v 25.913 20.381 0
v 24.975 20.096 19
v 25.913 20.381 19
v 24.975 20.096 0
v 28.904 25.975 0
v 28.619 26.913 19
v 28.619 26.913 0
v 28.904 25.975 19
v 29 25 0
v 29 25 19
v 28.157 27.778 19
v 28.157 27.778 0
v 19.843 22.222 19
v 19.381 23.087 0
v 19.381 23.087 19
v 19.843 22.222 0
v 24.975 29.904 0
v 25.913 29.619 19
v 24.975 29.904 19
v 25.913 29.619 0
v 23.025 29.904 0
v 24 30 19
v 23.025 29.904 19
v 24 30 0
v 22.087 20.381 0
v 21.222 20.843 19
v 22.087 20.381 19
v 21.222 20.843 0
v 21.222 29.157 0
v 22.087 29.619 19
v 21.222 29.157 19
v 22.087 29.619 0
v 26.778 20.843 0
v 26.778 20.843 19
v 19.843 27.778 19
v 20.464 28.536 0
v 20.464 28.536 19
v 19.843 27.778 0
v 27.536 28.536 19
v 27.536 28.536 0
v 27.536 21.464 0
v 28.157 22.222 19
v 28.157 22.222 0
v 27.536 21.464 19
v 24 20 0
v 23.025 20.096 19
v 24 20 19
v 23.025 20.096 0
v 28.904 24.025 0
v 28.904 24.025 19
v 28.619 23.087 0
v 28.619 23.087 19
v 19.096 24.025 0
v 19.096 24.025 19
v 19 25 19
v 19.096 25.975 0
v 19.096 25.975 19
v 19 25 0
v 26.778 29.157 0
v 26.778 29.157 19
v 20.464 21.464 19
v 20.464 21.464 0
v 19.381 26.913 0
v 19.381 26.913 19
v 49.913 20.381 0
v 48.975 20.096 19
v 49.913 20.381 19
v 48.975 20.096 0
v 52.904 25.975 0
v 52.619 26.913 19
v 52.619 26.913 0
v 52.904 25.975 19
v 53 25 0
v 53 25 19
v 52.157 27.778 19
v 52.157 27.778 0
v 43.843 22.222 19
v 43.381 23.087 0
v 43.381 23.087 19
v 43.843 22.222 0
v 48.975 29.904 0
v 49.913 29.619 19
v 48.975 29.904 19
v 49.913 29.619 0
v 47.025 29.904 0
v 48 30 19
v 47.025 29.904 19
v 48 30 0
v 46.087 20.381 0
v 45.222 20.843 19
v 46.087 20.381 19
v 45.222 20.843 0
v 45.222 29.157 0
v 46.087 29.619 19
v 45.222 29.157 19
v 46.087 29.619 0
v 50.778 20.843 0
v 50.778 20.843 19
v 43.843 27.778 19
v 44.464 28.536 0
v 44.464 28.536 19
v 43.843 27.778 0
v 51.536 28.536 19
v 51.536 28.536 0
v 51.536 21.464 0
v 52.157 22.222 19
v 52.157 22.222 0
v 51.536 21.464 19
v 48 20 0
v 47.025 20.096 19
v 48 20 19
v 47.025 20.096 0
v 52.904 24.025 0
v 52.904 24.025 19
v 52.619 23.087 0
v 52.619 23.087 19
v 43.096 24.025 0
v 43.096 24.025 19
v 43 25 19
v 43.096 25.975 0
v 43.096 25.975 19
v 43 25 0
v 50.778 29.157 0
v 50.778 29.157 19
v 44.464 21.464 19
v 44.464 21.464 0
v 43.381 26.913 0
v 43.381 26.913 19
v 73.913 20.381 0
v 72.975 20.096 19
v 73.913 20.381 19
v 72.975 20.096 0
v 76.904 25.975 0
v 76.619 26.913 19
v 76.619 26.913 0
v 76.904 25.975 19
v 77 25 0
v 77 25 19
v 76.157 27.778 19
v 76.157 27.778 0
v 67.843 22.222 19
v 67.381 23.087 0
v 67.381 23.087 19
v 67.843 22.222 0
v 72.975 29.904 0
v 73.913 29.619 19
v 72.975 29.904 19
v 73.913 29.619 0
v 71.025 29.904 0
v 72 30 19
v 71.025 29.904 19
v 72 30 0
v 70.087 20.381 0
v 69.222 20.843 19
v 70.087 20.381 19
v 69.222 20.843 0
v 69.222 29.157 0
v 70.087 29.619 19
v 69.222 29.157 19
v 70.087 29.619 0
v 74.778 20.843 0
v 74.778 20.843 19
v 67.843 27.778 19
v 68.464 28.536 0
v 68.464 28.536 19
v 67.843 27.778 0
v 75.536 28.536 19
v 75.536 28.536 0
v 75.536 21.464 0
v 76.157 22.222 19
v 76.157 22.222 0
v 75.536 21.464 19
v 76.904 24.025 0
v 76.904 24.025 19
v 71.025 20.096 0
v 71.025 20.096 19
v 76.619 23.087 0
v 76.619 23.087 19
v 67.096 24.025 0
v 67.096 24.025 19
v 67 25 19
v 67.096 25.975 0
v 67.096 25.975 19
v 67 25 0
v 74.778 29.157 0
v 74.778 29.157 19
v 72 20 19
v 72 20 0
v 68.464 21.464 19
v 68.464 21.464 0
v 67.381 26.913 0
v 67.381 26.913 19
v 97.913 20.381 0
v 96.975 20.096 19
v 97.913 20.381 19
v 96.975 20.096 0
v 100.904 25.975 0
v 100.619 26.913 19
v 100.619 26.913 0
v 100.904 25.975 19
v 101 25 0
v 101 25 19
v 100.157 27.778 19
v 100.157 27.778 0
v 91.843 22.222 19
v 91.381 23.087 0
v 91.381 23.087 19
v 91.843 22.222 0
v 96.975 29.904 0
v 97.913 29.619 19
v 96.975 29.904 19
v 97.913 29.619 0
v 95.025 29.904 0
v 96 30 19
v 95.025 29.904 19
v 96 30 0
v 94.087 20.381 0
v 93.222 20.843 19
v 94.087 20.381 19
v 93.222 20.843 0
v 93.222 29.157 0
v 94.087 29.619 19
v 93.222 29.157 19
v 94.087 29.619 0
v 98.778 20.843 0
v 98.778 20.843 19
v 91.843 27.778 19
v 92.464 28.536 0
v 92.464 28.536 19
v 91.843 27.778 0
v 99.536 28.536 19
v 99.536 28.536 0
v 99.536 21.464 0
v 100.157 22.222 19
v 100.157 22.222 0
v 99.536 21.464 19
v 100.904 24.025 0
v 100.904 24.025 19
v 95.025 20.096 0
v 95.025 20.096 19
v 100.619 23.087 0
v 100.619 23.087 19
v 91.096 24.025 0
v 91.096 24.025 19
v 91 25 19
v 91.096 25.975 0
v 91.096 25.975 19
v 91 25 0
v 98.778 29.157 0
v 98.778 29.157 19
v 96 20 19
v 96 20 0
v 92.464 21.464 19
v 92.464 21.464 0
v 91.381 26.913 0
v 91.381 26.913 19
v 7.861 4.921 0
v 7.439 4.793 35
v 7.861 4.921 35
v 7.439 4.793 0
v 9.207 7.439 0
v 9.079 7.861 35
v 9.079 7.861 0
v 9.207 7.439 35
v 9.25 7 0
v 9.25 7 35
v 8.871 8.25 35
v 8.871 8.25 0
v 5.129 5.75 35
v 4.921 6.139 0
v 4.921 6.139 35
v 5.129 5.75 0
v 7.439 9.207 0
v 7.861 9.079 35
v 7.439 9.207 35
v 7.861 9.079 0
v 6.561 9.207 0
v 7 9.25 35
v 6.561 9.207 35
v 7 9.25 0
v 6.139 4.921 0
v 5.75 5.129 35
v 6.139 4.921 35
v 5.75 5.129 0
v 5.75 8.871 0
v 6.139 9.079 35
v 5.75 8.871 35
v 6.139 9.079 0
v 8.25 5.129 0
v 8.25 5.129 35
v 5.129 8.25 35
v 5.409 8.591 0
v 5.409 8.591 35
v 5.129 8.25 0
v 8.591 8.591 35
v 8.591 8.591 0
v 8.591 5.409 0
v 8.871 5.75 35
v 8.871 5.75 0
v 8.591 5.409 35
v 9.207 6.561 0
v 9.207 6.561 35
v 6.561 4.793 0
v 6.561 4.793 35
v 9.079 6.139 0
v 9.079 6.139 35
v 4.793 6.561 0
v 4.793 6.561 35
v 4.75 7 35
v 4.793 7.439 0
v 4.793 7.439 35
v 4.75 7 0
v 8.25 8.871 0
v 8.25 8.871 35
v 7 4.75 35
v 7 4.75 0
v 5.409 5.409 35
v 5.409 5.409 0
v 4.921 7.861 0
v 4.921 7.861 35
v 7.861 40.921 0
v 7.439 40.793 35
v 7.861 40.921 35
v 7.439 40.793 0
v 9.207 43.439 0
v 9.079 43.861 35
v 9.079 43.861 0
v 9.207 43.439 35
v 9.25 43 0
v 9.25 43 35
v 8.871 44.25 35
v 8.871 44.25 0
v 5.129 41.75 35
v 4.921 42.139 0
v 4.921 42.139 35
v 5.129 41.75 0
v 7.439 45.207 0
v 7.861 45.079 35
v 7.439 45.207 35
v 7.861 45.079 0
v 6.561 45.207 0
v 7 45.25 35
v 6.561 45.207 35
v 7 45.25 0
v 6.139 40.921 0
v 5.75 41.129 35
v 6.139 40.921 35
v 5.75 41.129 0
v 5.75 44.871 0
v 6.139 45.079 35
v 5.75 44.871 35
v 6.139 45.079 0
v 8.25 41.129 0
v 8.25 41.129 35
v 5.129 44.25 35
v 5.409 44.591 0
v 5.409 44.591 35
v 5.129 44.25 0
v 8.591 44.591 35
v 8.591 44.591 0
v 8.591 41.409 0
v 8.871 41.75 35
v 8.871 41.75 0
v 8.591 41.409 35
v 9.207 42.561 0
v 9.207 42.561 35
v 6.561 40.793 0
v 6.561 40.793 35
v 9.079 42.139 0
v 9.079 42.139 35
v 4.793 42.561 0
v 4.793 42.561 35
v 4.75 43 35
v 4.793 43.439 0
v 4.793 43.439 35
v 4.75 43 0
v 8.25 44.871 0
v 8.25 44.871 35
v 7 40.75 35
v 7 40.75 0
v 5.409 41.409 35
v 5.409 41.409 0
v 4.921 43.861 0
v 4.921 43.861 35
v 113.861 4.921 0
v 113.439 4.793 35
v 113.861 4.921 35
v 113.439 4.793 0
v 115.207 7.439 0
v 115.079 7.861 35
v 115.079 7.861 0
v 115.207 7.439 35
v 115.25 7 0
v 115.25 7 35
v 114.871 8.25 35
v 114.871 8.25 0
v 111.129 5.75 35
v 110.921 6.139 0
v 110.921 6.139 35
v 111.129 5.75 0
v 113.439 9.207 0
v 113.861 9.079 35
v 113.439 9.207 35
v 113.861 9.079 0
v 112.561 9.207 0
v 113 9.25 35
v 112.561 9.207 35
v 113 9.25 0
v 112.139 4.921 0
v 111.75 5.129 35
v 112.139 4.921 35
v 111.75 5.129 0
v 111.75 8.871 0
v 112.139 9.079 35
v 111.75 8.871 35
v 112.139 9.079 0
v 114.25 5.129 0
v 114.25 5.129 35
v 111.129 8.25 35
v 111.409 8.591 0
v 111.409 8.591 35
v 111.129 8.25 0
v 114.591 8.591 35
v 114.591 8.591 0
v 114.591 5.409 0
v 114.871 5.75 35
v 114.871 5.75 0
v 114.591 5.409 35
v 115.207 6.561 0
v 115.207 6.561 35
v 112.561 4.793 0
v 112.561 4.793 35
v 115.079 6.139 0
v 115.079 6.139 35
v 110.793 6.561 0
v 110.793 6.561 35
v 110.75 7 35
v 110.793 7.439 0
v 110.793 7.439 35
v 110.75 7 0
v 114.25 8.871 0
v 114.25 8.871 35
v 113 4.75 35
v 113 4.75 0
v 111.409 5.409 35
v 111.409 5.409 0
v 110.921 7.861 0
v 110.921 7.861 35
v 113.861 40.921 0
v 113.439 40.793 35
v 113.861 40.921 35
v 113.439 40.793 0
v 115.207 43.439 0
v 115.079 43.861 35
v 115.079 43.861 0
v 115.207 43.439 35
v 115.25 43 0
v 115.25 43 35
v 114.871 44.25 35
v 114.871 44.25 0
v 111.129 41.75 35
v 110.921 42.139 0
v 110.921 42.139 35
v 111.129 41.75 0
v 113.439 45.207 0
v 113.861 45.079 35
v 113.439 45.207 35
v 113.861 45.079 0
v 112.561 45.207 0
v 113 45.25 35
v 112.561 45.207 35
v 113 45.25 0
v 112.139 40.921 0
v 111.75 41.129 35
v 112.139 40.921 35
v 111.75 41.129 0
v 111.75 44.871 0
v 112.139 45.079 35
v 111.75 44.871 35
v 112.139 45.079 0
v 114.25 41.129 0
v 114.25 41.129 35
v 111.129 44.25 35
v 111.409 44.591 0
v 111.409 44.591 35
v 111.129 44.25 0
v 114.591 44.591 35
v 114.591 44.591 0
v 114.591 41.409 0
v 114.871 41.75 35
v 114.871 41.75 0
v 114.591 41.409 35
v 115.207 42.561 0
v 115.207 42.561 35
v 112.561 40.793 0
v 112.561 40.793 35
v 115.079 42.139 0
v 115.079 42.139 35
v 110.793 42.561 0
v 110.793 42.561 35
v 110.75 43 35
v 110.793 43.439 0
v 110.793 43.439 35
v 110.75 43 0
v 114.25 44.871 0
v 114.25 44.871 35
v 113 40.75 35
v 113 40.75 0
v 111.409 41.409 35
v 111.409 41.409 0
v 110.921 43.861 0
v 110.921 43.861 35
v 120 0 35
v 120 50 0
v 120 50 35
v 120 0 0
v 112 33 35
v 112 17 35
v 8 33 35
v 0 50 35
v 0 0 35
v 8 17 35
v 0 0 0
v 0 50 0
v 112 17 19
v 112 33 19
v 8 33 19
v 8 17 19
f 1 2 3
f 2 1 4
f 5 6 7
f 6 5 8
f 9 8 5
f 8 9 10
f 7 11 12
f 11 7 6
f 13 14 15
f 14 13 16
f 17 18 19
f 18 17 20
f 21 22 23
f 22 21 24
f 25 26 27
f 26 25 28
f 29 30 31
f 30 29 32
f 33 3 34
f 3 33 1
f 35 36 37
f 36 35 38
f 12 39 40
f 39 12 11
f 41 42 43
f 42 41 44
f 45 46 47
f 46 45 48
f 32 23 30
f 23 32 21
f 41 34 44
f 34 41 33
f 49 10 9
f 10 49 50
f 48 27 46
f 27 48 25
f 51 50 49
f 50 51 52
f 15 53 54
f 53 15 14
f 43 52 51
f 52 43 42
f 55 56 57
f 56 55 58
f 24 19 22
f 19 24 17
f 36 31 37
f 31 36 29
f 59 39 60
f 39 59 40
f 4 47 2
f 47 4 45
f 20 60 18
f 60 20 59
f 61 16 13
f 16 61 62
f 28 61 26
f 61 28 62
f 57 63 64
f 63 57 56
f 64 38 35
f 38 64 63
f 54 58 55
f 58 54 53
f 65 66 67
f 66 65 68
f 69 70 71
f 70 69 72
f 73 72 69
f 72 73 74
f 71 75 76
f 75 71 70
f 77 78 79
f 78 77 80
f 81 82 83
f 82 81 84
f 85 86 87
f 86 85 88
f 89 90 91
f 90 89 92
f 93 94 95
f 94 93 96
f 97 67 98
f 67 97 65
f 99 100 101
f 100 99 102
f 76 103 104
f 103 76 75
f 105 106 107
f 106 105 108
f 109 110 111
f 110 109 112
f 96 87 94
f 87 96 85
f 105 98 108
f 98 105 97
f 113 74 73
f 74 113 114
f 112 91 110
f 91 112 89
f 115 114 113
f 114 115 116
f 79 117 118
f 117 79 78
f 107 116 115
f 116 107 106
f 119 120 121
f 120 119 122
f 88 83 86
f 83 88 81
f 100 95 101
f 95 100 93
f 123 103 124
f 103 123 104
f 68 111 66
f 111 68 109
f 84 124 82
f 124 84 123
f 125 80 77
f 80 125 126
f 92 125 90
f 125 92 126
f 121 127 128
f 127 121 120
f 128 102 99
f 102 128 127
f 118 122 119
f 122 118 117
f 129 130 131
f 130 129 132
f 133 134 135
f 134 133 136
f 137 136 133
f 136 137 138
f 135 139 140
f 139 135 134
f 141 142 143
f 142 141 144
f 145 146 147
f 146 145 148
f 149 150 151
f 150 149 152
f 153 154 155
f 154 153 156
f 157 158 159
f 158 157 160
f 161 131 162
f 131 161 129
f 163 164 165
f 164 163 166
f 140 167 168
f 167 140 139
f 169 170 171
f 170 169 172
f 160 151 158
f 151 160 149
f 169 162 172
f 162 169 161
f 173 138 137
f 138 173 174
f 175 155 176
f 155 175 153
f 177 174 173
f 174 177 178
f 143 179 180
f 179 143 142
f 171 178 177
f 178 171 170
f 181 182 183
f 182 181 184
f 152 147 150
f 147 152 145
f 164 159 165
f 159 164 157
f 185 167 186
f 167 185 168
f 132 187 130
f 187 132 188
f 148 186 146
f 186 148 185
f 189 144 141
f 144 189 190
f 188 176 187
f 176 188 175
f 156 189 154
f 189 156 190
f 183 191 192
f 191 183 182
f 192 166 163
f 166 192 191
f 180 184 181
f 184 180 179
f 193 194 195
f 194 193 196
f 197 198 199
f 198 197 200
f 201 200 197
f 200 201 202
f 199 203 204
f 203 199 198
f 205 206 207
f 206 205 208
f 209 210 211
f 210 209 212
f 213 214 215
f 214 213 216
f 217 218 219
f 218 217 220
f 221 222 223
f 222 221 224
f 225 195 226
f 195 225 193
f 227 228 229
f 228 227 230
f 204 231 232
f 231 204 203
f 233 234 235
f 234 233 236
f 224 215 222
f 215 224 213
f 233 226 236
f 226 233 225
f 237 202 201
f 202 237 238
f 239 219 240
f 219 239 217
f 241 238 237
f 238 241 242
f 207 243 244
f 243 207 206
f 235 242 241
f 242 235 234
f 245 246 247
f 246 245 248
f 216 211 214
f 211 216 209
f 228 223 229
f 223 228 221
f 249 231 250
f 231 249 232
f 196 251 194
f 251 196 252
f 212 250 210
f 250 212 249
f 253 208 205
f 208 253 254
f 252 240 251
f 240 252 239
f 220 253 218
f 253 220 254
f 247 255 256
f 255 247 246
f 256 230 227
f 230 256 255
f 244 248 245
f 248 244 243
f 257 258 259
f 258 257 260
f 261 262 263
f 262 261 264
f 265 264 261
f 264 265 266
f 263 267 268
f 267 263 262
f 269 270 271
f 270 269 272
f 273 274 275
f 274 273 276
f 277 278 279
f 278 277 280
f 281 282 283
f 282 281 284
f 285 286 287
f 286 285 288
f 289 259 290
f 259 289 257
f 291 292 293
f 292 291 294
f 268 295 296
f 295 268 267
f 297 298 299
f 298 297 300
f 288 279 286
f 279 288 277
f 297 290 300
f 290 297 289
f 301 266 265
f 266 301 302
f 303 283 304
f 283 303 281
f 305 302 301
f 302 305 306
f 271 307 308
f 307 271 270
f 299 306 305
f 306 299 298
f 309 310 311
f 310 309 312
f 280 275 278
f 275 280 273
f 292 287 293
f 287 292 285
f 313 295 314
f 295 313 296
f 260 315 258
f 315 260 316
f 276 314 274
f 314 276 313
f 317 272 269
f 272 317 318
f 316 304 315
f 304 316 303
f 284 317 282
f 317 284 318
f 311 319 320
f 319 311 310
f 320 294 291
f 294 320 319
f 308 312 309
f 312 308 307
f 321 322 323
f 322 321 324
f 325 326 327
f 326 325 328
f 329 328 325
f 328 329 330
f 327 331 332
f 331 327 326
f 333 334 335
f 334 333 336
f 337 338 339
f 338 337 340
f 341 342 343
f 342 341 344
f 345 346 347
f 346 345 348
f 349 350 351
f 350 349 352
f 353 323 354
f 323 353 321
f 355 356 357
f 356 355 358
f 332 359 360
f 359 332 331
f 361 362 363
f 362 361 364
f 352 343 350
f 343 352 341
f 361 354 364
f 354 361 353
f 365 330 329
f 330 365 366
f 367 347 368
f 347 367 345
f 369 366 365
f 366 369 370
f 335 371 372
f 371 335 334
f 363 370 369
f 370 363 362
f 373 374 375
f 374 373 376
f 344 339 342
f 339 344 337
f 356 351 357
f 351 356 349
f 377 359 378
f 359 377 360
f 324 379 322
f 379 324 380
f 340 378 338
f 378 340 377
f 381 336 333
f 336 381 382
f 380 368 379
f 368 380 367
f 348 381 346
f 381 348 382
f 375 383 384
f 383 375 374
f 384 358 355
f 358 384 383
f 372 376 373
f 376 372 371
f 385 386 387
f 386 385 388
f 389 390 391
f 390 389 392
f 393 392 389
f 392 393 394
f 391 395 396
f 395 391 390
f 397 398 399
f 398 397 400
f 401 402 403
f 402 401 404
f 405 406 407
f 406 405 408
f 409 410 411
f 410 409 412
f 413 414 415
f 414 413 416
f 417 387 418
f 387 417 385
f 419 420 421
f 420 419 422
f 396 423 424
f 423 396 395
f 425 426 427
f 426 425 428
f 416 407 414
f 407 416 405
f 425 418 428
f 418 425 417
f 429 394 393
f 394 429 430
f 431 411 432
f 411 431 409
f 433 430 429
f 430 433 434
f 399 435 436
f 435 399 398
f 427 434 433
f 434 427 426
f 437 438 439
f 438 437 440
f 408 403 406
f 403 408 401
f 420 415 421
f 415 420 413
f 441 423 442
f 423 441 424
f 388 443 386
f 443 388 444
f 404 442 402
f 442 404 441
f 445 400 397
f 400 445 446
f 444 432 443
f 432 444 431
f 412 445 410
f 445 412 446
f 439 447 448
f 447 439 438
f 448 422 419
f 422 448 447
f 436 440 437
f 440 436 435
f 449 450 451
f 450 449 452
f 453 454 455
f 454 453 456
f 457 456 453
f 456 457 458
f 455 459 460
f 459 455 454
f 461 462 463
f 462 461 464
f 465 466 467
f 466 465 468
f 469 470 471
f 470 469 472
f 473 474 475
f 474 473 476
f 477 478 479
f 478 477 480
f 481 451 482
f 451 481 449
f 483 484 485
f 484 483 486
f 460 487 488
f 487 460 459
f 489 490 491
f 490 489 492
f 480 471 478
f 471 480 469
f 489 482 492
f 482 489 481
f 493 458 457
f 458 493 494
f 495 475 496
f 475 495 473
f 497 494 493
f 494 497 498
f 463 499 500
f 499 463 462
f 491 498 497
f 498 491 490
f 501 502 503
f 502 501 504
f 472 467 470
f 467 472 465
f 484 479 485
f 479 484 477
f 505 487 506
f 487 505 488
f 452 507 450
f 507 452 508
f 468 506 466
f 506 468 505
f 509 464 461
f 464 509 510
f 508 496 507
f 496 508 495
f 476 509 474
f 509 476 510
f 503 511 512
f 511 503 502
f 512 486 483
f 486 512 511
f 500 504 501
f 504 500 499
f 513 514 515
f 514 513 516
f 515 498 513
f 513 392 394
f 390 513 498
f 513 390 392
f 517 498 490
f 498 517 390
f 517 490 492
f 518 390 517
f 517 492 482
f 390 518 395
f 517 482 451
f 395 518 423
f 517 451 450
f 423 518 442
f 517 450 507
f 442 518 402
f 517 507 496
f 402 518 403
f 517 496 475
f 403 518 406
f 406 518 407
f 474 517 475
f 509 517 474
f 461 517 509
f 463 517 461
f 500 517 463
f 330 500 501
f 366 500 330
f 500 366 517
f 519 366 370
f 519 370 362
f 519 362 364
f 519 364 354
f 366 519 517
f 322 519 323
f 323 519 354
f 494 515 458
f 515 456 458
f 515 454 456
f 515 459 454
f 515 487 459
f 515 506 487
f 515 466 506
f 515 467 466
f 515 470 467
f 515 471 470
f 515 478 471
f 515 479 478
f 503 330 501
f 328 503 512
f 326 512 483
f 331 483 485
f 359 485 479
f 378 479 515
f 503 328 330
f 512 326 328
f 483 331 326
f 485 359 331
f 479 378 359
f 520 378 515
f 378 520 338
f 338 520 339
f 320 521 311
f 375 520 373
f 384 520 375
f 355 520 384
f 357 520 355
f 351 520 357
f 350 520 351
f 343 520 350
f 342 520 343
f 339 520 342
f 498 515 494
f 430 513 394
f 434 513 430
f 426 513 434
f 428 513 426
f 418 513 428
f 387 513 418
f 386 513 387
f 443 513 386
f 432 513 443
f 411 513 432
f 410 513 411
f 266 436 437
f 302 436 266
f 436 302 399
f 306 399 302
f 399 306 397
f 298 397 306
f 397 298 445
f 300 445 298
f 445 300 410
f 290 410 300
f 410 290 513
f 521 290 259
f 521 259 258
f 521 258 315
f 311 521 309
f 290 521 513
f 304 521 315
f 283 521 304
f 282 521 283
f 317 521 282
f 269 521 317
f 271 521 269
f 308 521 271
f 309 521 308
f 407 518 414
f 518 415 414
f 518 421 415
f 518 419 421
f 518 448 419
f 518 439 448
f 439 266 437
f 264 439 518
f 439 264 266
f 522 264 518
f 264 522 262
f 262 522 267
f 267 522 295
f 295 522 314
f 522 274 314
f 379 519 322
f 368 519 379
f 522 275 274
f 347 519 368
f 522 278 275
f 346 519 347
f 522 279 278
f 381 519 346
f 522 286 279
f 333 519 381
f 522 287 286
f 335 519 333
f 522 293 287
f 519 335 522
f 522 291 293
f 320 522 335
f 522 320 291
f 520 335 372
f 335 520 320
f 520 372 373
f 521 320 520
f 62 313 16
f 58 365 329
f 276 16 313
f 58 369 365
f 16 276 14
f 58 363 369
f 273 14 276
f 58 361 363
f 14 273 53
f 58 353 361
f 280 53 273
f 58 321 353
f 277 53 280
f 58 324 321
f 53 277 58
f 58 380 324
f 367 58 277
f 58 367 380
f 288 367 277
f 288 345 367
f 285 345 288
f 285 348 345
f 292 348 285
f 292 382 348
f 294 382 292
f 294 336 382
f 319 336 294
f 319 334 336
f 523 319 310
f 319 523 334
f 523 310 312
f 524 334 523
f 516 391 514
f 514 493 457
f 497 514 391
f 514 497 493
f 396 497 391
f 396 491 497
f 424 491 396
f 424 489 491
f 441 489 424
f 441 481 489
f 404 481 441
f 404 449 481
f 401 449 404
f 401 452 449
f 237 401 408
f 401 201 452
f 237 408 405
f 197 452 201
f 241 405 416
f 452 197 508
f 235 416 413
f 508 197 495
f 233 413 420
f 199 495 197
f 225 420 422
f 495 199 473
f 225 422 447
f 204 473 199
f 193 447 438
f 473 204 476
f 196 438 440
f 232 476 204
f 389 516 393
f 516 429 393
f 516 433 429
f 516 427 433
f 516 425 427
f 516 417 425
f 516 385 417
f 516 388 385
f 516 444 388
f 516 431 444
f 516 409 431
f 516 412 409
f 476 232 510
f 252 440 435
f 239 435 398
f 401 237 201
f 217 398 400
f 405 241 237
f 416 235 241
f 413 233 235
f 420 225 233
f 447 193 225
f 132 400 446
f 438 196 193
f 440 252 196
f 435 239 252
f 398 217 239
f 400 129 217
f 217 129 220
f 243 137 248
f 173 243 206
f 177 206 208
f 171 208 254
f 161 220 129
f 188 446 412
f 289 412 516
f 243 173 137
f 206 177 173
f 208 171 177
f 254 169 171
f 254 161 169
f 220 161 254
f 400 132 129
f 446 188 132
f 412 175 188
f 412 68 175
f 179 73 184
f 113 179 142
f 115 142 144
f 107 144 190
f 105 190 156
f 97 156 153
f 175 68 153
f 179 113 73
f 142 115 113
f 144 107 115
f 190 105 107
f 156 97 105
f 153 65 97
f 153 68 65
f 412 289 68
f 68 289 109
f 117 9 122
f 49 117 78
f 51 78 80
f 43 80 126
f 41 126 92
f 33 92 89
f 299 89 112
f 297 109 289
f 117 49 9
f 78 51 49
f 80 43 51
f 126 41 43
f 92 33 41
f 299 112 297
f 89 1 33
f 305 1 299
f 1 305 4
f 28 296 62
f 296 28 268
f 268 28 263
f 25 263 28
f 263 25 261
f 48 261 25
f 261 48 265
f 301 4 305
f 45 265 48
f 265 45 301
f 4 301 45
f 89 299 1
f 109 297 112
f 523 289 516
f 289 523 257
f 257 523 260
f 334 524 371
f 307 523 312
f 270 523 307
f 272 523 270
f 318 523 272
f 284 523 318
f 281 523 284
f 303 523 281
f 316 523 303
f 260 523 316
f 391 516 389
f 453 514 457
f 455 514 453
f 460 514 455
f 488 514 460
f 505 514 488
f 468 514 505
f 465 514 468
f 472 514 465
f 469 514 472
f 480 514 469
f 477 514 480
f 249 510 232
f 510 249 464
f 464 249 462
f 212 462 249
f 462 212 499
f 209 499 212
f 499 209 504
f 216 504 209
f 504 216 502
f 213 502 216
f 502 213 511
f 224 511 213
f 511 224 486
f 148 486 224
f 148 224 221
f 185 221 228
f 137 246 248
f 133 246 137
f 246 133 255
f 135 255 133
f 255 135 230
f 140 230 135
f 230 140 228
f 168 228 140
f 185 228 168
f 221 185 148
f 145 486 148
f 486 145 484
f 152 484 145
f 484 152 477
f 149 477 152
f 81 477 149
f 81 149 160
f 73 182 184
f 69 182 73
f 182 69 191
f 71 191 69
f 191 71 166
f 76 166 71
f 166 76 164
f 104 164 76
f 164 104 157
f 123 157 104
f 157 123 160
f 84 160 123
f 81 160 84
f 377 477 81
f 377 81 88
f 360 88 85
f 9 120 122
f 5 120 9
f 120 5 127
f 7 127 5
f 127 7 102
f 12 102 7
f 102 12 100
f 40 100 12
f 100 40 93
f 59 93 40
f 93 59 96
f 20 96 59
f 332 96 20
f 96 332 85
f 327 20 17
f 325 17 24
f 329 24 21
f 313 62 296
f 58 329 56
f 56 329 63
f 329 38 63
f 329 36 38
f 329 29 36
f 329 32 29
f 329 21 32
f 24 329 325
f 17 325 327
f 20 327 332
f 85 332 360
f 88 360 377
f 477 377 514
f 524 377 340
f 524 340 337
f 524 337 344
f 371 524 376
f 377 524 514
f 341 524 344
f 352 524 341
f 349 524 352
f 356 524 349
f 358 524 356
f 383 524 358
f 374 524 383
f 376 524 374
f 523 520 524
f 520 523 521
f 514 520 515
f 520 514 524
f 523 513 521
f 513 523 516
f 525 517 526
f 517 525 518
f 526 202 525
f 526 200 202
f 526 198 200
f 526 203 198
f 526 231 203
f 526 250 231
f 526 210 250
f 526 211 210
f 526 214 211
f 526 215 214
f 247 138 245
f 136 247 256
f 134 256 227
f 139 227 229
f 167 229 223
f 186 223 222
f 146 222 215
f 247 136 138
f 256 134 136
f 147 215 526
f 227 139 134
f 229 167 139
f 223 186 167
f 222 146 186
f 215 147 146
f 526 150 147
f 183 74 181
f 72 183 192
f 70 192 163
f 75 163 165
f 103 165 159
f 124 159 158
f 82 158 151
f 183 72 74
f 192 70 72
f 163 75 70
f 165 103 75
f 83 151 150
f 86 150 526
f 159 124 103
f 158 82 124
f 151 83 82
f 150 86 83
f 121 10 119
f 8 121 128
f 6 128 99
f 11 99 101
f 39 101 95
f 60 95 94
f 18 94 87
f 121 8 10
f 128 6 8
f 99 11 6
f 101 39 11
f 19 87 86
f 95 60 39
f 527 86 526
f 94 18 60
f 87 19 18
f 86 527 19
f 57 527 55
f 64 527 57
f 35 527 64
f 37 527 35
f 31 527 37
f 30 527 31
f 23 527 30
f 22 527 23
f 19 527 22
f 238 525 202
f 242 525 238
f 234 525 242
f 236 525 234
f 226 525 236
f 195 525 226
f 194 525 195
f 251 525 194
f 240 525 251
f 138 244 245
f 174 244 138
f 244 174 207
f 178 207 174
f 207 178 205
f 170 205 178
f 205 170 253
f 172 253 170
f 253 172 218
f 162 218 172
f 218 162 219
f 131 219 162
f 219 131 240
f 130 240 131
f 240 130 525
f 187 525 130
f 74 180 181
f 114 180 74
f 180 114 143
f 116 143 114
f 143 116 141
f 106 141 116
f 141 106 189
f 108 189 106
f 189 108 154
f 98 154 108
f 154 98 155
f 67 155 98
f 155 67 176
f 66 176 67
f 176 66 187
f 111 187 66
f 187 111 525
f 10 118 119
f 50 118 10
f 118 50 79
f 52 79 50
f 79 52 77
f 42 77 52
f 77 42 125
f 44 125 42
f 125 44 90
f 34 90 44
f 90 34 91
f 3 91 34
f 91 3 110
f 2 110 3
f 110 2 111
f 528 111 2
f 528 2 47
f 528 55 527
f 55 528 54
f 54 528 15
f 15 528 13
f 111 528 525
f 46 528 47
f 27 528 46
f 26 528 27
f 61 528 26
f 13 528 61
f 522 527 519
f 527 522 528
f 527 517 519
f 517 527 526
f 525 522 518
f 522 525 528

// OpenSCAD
$fn = 32;

// ----------------------------------------------------------------------
// Manifold block: gallery_top manifold
// ----------------------------------------------------------------------

// --- parameters (mm) ---
block_l = 120;            // block length, X
block_w = 50;             // block width, Y
block_h = 35;             // block height, Z
port_d = 10;              // port bore diameter
port_pitch = 24;          // port pitch along X
gallery_d = 16;           // top gallery width, Y
gallery_depth = 16;       // gallery pocket depth
wall_p = 8;               // gallery end wall thickness, X
mnt_d = 4.5;              // mounting hole diameter
mnt_in = 7;               // mounting hole inset from the edges

n_ports = 4;  // ports in the row
port_x0 = (block_l - (n_ports - 1) * port_pitch) / 2;  // first port X

difference() {
  cube([block_l, block_w, block_h]);
  for (i = [0 : n_ports - 1])
    translate([port_x0 + i * port_pitch, block_w / 2, -1])
      cylinder(h = block_h + 2, d = port_d);
  translate([wall_p, block_w / 2 - gallery_d / 2, block_h - gallery_depth])
    cube([block_l - 2 * wall_p, gallery_d, gallery_depth + 1]);
  for (cx = [mnt_in, block_l - mnt_in])
    for (cy = [mnt_in, block_w - mnt_in])
      translate([cx, cy, -1]) cylinder(h = block_h + 2, d = mnt_d);
}
